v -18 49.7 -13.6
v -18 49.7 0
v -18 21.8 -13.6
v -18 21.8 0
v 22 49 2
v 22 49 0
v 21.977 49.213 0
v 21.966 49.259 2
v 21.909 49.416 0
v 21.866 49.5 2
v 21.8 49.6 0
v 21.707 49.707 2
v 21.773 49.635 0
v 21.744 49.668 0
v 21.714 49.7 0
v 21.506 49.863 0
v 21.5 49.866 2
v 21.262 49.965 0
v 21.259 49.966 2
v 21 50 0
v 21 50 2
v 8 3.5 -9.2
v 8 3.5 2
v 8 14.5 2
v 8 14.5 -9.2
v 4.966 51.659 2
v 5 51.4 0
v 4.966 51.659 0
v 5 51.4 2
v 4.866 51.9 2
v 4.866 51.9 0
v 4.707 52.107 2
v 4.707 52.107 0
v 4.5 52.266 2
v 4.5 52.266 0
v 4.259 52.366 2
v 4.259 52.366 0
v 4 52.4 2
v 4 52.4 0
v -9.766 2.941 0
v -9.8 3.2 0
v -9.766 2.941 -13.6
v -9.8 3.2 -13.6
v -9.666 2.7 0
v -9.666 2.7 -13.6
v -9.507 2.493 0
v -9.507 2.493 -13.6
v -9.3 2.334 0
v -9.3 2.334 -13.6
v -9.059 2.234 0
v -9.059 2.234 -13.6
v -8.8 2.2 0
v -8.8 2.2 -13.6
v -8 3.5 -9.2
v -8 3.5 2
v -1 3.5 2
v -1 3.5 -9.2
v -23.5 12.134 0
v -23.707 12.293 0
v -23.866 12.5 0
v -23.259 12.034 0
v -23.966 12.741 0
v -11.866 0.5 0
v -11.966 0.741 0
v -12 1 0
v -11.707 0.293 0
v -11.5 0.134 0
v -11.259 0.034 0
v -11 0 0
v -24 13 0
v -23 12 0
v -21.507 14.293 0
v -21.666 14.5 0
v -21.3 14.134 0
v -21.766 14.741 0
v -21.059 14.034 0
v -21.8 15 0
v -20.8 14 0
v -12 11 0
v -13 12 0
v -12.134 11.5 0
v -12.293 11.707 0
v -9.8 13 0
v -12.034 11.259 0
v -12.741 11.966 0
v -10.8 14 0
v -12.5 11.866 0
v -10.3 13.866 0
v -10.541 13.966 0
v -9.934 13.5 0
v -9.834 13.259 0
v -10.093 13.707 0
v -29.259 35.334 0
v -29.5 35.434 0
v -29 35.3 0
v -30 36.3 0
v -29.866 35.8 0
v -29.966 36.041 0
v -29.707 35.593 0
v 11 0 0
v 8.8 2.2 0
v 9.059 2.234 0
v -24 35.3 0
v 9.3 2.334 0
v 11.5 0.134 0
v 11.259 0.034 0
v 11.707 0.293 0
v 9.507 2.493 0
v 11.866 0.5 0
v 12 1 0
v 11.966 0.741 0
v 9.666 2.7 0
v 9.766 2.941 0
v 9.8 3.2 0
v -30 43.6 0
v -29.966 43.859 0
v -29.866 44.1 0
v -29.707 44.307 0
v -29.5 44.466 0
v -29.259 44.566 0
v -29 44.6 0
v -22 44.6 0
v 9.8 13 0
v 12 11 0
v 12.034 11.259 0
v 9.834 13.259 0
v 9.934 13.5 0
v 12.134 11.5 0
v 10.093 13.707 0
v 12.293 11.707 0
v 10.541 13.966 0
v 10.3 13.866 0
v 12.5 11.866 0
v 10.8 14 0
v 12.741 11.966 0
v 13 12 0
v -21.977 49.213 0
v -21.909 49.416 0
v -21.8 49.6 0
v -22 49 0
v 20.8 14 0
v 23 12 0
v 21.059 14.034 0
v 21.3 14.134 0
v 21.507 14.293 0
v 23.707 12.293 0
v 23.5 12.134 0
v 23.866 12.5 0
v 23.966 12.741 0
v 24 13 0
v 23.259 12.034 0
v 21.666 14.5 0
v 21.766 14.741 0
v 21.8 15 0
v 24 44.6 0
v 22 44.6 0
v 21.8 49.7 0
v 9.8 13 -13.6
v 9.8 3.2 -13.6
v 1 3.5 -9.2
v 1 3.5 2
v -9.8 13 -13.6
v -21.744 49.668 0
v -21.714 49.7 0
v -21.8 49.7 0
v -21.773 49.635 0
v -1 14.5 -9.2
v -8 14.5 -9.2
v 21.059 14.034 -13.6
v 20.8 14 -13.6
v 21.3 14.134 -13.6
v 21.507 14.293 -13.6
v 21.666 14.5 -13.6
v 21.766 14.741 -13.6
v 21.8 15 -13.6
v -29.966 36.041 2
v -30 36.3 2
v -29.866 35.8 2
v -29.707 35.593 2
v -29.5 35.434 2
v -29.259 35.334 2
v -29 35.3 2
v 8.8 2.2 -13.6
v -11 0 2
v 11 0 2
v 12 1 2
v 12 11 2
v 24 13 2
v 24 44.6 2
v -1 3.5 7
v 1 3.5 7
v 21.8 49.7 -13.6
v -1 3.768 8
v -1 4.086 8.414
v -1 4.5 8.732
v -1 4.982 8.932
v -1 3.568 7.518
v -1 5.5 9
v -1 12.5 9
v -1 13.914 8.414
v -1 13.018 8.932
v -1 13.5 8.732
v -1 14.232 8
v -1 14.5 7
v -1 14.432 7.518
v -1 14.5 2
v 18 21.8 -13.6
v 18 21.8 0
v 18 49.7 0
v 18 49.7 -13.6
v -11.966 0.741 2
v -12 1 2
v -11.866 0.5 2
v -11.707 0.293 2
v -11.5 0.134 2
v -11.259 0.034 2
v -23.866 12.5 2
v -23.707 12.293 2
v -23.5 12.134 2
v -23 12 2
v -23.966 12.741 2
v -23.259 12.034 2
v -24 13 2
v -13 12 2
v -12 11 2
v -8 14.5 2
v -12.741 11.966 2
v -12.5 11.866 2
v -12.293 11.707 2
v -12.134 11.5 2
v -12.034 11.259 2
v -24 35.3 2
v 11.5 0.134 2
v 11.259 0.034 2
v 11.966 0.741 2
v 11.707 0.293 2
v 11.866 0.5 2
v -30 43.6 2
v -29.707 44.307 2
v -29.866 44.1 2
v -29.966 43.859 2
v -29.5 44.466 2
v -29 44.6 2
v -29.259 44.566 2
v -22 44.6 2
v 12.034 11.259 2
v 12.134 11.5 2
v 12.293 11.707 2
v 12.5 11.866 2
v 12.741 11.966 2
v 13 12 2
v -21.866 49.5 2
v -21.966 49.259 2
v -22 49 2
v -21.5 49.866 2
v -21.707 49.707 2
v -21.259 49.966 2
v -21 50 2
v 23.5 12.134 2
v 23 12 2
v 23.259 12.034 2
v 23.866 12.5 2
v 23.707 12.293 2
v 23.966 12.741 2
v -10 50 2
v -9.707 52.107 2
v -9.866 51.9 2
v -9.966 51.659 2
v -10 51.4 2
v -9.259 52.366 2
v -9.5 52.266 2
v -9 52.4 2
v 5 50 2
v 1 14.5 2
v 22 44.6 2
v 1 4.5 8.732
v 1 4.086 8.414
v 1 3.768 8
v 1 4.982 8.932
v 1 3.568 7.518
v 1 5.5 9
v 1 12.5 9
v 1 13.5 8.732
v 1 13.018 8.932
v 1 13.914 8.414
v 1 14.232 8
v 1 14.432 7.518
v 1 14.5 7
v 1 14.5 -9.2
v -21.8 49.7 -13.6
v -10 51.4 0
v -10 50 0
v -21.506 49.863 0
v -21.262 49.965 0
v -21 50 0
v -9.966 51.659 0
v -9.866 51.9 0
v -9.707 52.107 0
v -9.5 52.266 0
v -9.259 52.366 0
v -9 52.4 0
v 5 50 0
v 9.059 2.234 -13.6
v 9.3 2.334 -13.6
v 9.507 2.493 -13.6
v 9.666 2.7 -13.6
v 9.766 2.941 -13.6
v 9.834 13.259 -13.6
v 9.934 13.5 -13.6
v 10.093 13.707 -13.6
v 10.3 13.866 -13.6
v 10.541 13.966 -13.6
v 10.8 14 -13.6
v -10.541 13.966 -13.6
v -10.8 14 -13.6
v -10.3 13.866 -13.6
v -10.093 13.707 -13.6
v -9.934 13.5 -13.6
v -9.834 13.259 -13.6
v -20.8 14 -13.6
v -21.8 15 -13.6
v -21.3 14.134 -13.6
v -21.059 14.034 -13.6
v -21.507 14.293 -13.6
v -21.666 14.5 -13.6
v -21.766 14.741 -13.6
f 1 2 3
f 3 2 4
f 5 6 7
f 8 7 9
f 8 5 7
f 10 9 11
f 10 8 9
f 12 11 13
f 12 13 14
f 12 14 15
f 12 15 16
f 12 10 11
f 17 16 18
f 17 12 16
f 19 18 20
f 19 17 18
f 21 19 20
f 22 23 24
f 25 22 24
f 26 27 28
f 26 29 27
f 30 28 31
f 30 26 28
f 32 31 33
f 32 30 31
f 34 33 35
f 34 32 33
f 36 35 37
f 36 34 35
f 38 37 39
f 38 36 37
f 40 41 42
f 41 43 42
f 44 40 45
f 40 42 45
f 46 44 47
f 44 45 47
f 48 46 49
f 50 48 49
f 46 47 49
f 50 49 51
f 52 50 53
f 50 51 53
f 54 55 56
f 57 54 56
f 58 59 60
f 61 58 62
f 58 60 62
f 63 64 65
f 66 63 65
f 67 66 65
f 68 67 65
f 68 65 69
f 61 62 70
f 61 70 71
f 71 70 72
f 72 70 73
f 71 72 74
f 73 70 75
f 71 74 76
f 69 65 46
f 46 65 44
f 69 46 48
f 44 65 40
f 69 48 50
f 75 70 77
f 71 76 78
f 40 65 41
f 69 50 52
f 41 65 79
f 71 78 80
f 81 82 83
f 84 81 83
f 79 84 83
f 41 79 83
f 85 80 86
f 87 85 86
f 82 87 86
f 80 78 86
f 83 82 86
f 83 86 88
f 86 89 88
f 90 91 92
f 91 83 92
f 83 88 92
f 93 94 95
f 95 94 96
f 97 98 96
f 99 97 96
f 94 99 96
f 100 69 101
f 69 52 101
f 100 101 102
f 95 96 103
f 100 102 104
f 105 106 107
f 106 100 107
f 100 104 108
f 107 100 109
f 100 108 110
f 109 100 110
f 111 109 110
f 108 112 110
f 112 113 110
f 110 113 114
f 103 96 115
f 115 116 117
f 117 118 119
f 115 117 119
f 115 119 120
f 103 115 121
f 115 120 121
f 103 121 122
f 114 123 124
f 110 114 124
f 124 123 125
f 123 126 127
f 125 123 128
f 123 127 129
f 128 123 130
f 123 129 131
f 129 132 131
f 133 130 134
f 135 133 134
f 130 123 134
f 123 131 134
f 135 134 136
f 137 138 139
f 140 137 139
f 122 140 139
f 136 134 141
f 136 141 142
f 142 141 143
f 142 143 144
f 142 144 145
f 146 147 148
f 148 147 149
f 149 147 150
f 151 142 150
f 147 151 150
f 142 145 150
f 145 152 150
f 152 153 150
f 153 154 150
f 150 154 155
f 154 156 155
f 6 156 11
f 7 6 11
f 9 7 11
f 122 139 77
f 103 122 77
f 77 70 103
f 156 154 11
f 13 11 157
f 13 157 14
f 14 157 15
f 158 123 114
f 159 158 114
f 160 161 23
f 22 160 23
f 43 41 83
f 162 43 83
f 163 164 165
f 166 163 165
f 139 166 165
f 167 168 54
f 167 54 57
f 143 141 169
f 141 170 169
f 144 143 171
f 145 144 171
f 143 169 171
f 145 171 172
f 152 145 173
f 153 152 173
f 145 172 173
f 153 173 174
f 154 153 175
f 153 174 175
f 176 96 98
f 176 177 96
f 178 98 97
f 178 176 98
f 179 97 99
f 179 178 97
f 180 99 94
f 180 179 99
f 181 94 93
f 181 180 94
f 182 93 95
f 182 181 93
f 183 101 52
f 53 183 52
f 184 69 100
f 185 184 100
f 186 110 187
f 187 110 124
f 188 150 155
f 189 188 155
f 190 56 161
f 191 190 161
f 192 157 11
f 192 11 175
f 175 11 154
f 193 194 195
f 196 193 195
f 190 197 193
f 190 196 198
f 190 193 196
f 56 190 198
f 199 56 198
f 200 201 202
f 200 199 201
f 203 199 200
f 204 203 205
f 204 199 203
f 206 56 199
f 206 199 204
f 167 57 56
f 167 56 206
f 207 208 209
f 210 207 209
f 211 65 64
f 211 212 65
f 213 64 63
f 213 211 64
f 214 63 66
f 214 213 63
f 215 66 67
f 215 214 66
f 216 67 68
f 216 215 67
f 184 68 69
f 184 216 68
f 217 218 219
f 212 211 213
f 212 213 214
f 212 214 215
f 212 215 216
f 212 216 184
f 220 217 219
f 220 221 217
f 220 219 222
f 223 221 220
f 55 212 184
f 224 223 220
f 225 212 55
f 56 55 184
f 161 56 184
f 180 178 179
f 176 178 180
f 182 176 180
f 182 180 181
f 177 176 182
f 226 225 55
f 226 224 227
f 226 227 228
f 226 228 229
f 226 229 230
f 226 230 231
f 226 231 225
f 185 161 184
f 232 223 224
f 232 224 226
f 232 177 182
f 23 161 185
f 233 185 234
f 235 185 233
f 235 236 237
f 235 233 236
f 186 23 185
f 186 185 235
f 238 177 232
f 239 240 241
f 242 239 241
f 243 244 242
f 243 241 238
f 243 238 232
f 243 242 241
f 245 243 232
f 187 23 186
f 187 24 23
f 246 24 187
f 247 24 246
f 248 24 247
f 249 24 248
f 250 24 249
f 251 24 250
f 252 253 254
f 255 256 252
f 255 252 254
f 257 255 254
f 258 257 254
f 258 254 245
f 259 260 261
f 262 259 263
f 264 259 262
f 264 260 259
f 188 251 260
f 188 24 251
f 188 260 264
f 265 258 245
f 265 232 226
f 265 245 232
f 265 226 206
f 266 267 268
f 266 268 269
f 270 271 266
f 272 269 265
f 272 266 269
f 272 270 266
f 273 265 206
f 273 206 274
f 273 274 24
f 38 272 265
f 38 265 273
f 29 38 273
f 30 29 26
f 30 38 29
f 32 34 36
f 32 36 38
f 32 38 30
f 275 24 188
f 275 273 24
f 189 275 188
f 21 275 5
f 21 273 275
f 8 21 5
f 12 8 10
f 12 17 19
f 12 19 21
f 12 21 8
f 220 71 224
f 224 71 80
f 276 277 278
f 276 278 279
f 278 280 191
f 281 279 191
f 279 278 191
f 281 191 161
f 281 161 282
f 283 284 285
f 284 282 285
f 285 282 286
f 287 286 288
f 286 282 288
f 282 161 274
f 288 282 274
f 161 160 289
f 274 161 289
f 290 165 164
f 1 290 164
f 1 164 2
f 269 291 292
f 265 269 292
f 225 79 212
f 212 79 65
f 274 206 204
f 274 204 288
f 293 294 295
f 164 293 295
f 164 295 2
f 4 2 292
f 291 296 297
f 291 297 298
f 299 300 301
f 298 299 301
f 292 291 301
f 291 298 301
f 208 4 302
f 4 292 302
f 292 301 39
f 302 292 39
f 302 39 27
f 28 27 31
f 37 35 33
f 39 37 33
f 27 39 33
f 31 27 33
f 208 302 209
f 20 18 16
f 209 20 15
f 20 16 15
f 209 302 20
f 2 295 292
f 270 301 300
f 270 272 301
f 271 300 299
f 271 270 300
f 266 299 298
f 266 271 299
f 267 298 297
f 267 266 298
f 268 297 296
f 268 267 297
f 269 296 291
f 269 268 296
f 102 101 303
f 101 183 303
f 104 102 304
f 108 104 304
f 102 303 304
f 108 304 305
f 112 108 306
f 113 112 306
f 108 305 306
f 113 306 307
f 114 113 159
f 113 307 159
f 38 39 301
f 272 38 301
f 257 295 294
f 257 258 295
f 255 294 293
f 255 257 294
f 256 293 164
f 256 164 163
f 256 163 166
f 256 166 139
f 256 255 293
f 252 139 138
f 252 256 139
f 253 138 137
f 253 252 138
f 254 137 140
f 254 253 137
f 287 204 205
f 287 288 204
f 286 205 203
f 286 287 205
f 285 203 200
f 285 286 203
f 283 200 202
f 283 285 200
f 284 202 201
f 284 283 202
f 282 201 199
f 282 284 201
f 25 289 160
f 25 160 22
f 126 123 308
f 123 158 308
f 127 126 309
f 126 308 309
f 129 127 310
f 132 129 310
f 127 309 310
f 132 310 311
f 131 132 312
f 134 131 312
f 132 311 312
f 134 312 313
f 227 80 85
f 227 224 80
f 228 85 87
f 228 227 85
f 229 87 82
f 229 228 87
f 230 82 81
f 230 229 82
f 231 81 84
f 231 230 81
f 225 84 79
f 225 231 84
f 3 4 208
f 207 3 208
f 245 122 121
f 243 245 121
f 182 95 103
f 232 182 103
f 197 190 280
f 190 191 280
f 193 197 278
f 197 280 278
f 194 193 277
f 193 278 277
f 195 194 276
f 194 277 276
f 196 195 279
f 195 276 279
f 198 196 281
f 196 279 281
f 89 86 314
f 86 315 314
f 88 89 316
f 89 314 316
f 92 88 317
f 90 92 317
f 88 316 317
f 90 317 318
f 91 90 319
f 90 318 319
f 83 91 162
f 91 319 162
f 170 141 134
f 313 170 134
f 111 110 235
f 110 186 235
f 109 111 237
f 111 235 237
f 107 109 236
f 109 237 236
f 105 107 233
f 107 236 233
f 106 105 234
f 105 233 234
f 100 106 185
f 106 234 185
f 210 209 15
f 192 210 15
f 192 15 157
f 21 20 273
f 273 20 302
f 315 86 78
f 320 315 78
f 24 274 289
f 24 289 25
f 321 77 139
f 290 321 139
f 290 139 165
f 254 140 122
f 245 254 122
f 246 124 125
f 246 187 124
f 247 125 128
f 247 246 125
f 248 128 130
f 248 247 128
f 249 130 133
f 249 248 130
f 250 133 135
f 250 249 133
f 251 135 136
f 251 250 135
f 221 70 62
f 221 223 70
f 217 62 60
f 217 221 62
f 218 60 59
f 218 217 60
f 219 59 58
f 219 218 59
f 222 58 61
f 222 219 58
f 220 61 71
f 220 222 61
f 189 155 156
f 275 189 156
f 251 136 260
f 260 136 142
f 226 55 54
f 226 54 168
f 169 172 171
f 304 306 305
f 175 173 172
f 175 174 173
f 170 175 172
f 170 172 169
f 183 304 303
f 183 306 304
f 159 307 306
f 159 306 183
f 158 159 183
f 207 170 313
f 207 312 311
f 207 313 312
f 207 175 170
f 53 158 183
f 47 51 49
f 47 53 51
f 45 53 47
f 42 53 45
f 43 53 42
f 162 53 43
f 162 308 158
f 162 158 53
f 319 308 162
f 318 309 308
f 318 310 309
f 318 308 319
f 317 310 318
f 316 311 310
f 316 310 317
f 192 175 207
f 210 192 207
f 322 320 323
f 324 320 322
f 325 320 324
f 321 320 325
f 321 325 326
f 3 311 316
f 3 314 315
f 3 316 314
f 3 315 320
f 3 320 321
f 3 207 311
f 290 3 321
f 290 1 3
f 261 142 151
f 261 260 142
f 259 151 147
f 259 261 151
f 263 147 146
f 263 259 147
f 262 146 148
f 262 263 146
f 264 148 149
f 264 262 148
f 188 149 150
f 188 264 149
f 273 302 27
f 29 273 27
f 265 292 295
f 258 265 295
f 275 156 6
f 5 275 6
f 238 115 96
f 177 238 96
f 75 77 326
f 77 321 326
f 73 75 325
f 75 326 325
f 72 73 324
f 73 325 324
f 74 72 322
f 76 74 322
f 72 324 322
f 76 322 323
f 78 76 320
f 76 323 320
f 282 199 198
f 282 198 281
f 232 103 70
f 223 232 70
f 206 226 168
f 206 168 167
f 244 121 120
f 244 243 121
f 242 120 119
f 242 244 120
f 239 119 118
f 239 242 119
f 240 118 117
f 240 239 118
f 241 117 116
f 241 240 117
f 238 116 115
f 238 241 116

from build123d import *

# Parameters (mm, degrees)
BOSS_EXTRUDE1_DEPTH = 2
FILLET1_R           = 1
BOSS_EXTRUDE2_DEPTH = 13.6
SKETCH4_W           = 7
SKETCH4_H           = 11
CUT_EXTRUDE1_DEPTH  = 11.2
SKETCH5_W           = 2
SKETCH5_H           = 11
BOSS_EXTRUDE3_DEPTH = 7
FILLET2_R           = 2
FILLET3_R           = 1


with BuildPart() as part:
    # Sketch1 → Boss-Extrude1 (new body)
    with BuildSketch(Plane.XY):
        Polygon((0, 0), (12, 0), (12, 12), (24, 12), (24, 44.6), (22, 44.6), (22, 50), (5, 50), (5, 52.4), (-10, 52.4), (-10, 50), (-22, 50), (-22, 44.6), (-30, 44.6), (-30, 35.3), (-24, 35.3), (-24, 12), (-12, 12), (-12, 0), align=None)
    extrude(amount=BOSS_EXTRUDE1_DEPTH)

    # Fillet1
    fillet1_edges = [part.edges().sort_by_distance(p)[0] for p in [
        (-12, 0, 1),
        (-12, 12, 1),
        (-24, 12, 1),
        (-30, 35.3, 1),
        (-30, 44.6, 1),
        (-22, 50, 1),
        (-10, 52.4, 1),
        (5, 52.4, 1),
        (22, 50, 1),
        (24, 12, 1),
        (12, 12, 1),
        (12, 0, 1),
    ]]
    fillet(fillet1_edges, radius=FILLET1_R)

    # Sketch3 → Boss-Extrude2 (add)
    with BuildSketch(Plane(origin=(0, 0, 0), x_dir=(-1, 0, 0), z_dir=(0, 0, -1))):
        Polygon((-21.8, 49.7), (-21.8, 14), (-9.8, 14), (-9.8, 2.2), (9.8, 2.2), (9.8, 14), (21.8, 14), (21.8, 49.7), (18, 49.7), (18, 21.8), (-18, 21.8), (-18, 49.7), align=None)
    extrude(amount=BOSS_EXTRUDE2_DEPTH)

    # Sketch4 → Cut-Extrude1 (cut)
    with BuildSketch(Plane.XY.offset(2)):
        with Locations((4.5, 9)):
            Rectangle(SKETCH4_W, SKETCH4_H)
        with Locations((-4.5, 9)):
            Rectangle(SKETCH4_W, SKETCH4_H)
    extrude(amount=-CUT_EXTRUDE1_DEPTH, mode=Mode.SUBTRACT)

    # Sketch5 → Boss-Extrude3 (add)
    with BuildSketch(Plane.XY.offset(2)):
        with Locations((0, 9)):
            Rectangle(SKETCH5_W, SKETCH5_H)
    extrude(amount=BOSS_EXTRUDE3_DEPTH)

    # Fillet2
    fillet2_edges = [part.edges().sort_by_distance(p)[0] for p in [
        (0, 14.5, 9),
        (0, 3.5, 9),
    ]]
    fillet(fillet2_edges, radius=FILLET2_R)

    # Fillet3
    fillet3_edges = [part.edges().sort_by_distance(p)[0] for p in [
        (21.8, 14, -6.8),
        (9.8, 14, -6.8),
        (9.8, 2.2, -6.8),
        (-9.8, 2.2, -6.8),
        (-9.8, 14, -6.8),
        (-21.8, 14, -6.8),
    ]]
    fillet(fillet3_edges, radius=FILLET3_R)


solid = part.part
